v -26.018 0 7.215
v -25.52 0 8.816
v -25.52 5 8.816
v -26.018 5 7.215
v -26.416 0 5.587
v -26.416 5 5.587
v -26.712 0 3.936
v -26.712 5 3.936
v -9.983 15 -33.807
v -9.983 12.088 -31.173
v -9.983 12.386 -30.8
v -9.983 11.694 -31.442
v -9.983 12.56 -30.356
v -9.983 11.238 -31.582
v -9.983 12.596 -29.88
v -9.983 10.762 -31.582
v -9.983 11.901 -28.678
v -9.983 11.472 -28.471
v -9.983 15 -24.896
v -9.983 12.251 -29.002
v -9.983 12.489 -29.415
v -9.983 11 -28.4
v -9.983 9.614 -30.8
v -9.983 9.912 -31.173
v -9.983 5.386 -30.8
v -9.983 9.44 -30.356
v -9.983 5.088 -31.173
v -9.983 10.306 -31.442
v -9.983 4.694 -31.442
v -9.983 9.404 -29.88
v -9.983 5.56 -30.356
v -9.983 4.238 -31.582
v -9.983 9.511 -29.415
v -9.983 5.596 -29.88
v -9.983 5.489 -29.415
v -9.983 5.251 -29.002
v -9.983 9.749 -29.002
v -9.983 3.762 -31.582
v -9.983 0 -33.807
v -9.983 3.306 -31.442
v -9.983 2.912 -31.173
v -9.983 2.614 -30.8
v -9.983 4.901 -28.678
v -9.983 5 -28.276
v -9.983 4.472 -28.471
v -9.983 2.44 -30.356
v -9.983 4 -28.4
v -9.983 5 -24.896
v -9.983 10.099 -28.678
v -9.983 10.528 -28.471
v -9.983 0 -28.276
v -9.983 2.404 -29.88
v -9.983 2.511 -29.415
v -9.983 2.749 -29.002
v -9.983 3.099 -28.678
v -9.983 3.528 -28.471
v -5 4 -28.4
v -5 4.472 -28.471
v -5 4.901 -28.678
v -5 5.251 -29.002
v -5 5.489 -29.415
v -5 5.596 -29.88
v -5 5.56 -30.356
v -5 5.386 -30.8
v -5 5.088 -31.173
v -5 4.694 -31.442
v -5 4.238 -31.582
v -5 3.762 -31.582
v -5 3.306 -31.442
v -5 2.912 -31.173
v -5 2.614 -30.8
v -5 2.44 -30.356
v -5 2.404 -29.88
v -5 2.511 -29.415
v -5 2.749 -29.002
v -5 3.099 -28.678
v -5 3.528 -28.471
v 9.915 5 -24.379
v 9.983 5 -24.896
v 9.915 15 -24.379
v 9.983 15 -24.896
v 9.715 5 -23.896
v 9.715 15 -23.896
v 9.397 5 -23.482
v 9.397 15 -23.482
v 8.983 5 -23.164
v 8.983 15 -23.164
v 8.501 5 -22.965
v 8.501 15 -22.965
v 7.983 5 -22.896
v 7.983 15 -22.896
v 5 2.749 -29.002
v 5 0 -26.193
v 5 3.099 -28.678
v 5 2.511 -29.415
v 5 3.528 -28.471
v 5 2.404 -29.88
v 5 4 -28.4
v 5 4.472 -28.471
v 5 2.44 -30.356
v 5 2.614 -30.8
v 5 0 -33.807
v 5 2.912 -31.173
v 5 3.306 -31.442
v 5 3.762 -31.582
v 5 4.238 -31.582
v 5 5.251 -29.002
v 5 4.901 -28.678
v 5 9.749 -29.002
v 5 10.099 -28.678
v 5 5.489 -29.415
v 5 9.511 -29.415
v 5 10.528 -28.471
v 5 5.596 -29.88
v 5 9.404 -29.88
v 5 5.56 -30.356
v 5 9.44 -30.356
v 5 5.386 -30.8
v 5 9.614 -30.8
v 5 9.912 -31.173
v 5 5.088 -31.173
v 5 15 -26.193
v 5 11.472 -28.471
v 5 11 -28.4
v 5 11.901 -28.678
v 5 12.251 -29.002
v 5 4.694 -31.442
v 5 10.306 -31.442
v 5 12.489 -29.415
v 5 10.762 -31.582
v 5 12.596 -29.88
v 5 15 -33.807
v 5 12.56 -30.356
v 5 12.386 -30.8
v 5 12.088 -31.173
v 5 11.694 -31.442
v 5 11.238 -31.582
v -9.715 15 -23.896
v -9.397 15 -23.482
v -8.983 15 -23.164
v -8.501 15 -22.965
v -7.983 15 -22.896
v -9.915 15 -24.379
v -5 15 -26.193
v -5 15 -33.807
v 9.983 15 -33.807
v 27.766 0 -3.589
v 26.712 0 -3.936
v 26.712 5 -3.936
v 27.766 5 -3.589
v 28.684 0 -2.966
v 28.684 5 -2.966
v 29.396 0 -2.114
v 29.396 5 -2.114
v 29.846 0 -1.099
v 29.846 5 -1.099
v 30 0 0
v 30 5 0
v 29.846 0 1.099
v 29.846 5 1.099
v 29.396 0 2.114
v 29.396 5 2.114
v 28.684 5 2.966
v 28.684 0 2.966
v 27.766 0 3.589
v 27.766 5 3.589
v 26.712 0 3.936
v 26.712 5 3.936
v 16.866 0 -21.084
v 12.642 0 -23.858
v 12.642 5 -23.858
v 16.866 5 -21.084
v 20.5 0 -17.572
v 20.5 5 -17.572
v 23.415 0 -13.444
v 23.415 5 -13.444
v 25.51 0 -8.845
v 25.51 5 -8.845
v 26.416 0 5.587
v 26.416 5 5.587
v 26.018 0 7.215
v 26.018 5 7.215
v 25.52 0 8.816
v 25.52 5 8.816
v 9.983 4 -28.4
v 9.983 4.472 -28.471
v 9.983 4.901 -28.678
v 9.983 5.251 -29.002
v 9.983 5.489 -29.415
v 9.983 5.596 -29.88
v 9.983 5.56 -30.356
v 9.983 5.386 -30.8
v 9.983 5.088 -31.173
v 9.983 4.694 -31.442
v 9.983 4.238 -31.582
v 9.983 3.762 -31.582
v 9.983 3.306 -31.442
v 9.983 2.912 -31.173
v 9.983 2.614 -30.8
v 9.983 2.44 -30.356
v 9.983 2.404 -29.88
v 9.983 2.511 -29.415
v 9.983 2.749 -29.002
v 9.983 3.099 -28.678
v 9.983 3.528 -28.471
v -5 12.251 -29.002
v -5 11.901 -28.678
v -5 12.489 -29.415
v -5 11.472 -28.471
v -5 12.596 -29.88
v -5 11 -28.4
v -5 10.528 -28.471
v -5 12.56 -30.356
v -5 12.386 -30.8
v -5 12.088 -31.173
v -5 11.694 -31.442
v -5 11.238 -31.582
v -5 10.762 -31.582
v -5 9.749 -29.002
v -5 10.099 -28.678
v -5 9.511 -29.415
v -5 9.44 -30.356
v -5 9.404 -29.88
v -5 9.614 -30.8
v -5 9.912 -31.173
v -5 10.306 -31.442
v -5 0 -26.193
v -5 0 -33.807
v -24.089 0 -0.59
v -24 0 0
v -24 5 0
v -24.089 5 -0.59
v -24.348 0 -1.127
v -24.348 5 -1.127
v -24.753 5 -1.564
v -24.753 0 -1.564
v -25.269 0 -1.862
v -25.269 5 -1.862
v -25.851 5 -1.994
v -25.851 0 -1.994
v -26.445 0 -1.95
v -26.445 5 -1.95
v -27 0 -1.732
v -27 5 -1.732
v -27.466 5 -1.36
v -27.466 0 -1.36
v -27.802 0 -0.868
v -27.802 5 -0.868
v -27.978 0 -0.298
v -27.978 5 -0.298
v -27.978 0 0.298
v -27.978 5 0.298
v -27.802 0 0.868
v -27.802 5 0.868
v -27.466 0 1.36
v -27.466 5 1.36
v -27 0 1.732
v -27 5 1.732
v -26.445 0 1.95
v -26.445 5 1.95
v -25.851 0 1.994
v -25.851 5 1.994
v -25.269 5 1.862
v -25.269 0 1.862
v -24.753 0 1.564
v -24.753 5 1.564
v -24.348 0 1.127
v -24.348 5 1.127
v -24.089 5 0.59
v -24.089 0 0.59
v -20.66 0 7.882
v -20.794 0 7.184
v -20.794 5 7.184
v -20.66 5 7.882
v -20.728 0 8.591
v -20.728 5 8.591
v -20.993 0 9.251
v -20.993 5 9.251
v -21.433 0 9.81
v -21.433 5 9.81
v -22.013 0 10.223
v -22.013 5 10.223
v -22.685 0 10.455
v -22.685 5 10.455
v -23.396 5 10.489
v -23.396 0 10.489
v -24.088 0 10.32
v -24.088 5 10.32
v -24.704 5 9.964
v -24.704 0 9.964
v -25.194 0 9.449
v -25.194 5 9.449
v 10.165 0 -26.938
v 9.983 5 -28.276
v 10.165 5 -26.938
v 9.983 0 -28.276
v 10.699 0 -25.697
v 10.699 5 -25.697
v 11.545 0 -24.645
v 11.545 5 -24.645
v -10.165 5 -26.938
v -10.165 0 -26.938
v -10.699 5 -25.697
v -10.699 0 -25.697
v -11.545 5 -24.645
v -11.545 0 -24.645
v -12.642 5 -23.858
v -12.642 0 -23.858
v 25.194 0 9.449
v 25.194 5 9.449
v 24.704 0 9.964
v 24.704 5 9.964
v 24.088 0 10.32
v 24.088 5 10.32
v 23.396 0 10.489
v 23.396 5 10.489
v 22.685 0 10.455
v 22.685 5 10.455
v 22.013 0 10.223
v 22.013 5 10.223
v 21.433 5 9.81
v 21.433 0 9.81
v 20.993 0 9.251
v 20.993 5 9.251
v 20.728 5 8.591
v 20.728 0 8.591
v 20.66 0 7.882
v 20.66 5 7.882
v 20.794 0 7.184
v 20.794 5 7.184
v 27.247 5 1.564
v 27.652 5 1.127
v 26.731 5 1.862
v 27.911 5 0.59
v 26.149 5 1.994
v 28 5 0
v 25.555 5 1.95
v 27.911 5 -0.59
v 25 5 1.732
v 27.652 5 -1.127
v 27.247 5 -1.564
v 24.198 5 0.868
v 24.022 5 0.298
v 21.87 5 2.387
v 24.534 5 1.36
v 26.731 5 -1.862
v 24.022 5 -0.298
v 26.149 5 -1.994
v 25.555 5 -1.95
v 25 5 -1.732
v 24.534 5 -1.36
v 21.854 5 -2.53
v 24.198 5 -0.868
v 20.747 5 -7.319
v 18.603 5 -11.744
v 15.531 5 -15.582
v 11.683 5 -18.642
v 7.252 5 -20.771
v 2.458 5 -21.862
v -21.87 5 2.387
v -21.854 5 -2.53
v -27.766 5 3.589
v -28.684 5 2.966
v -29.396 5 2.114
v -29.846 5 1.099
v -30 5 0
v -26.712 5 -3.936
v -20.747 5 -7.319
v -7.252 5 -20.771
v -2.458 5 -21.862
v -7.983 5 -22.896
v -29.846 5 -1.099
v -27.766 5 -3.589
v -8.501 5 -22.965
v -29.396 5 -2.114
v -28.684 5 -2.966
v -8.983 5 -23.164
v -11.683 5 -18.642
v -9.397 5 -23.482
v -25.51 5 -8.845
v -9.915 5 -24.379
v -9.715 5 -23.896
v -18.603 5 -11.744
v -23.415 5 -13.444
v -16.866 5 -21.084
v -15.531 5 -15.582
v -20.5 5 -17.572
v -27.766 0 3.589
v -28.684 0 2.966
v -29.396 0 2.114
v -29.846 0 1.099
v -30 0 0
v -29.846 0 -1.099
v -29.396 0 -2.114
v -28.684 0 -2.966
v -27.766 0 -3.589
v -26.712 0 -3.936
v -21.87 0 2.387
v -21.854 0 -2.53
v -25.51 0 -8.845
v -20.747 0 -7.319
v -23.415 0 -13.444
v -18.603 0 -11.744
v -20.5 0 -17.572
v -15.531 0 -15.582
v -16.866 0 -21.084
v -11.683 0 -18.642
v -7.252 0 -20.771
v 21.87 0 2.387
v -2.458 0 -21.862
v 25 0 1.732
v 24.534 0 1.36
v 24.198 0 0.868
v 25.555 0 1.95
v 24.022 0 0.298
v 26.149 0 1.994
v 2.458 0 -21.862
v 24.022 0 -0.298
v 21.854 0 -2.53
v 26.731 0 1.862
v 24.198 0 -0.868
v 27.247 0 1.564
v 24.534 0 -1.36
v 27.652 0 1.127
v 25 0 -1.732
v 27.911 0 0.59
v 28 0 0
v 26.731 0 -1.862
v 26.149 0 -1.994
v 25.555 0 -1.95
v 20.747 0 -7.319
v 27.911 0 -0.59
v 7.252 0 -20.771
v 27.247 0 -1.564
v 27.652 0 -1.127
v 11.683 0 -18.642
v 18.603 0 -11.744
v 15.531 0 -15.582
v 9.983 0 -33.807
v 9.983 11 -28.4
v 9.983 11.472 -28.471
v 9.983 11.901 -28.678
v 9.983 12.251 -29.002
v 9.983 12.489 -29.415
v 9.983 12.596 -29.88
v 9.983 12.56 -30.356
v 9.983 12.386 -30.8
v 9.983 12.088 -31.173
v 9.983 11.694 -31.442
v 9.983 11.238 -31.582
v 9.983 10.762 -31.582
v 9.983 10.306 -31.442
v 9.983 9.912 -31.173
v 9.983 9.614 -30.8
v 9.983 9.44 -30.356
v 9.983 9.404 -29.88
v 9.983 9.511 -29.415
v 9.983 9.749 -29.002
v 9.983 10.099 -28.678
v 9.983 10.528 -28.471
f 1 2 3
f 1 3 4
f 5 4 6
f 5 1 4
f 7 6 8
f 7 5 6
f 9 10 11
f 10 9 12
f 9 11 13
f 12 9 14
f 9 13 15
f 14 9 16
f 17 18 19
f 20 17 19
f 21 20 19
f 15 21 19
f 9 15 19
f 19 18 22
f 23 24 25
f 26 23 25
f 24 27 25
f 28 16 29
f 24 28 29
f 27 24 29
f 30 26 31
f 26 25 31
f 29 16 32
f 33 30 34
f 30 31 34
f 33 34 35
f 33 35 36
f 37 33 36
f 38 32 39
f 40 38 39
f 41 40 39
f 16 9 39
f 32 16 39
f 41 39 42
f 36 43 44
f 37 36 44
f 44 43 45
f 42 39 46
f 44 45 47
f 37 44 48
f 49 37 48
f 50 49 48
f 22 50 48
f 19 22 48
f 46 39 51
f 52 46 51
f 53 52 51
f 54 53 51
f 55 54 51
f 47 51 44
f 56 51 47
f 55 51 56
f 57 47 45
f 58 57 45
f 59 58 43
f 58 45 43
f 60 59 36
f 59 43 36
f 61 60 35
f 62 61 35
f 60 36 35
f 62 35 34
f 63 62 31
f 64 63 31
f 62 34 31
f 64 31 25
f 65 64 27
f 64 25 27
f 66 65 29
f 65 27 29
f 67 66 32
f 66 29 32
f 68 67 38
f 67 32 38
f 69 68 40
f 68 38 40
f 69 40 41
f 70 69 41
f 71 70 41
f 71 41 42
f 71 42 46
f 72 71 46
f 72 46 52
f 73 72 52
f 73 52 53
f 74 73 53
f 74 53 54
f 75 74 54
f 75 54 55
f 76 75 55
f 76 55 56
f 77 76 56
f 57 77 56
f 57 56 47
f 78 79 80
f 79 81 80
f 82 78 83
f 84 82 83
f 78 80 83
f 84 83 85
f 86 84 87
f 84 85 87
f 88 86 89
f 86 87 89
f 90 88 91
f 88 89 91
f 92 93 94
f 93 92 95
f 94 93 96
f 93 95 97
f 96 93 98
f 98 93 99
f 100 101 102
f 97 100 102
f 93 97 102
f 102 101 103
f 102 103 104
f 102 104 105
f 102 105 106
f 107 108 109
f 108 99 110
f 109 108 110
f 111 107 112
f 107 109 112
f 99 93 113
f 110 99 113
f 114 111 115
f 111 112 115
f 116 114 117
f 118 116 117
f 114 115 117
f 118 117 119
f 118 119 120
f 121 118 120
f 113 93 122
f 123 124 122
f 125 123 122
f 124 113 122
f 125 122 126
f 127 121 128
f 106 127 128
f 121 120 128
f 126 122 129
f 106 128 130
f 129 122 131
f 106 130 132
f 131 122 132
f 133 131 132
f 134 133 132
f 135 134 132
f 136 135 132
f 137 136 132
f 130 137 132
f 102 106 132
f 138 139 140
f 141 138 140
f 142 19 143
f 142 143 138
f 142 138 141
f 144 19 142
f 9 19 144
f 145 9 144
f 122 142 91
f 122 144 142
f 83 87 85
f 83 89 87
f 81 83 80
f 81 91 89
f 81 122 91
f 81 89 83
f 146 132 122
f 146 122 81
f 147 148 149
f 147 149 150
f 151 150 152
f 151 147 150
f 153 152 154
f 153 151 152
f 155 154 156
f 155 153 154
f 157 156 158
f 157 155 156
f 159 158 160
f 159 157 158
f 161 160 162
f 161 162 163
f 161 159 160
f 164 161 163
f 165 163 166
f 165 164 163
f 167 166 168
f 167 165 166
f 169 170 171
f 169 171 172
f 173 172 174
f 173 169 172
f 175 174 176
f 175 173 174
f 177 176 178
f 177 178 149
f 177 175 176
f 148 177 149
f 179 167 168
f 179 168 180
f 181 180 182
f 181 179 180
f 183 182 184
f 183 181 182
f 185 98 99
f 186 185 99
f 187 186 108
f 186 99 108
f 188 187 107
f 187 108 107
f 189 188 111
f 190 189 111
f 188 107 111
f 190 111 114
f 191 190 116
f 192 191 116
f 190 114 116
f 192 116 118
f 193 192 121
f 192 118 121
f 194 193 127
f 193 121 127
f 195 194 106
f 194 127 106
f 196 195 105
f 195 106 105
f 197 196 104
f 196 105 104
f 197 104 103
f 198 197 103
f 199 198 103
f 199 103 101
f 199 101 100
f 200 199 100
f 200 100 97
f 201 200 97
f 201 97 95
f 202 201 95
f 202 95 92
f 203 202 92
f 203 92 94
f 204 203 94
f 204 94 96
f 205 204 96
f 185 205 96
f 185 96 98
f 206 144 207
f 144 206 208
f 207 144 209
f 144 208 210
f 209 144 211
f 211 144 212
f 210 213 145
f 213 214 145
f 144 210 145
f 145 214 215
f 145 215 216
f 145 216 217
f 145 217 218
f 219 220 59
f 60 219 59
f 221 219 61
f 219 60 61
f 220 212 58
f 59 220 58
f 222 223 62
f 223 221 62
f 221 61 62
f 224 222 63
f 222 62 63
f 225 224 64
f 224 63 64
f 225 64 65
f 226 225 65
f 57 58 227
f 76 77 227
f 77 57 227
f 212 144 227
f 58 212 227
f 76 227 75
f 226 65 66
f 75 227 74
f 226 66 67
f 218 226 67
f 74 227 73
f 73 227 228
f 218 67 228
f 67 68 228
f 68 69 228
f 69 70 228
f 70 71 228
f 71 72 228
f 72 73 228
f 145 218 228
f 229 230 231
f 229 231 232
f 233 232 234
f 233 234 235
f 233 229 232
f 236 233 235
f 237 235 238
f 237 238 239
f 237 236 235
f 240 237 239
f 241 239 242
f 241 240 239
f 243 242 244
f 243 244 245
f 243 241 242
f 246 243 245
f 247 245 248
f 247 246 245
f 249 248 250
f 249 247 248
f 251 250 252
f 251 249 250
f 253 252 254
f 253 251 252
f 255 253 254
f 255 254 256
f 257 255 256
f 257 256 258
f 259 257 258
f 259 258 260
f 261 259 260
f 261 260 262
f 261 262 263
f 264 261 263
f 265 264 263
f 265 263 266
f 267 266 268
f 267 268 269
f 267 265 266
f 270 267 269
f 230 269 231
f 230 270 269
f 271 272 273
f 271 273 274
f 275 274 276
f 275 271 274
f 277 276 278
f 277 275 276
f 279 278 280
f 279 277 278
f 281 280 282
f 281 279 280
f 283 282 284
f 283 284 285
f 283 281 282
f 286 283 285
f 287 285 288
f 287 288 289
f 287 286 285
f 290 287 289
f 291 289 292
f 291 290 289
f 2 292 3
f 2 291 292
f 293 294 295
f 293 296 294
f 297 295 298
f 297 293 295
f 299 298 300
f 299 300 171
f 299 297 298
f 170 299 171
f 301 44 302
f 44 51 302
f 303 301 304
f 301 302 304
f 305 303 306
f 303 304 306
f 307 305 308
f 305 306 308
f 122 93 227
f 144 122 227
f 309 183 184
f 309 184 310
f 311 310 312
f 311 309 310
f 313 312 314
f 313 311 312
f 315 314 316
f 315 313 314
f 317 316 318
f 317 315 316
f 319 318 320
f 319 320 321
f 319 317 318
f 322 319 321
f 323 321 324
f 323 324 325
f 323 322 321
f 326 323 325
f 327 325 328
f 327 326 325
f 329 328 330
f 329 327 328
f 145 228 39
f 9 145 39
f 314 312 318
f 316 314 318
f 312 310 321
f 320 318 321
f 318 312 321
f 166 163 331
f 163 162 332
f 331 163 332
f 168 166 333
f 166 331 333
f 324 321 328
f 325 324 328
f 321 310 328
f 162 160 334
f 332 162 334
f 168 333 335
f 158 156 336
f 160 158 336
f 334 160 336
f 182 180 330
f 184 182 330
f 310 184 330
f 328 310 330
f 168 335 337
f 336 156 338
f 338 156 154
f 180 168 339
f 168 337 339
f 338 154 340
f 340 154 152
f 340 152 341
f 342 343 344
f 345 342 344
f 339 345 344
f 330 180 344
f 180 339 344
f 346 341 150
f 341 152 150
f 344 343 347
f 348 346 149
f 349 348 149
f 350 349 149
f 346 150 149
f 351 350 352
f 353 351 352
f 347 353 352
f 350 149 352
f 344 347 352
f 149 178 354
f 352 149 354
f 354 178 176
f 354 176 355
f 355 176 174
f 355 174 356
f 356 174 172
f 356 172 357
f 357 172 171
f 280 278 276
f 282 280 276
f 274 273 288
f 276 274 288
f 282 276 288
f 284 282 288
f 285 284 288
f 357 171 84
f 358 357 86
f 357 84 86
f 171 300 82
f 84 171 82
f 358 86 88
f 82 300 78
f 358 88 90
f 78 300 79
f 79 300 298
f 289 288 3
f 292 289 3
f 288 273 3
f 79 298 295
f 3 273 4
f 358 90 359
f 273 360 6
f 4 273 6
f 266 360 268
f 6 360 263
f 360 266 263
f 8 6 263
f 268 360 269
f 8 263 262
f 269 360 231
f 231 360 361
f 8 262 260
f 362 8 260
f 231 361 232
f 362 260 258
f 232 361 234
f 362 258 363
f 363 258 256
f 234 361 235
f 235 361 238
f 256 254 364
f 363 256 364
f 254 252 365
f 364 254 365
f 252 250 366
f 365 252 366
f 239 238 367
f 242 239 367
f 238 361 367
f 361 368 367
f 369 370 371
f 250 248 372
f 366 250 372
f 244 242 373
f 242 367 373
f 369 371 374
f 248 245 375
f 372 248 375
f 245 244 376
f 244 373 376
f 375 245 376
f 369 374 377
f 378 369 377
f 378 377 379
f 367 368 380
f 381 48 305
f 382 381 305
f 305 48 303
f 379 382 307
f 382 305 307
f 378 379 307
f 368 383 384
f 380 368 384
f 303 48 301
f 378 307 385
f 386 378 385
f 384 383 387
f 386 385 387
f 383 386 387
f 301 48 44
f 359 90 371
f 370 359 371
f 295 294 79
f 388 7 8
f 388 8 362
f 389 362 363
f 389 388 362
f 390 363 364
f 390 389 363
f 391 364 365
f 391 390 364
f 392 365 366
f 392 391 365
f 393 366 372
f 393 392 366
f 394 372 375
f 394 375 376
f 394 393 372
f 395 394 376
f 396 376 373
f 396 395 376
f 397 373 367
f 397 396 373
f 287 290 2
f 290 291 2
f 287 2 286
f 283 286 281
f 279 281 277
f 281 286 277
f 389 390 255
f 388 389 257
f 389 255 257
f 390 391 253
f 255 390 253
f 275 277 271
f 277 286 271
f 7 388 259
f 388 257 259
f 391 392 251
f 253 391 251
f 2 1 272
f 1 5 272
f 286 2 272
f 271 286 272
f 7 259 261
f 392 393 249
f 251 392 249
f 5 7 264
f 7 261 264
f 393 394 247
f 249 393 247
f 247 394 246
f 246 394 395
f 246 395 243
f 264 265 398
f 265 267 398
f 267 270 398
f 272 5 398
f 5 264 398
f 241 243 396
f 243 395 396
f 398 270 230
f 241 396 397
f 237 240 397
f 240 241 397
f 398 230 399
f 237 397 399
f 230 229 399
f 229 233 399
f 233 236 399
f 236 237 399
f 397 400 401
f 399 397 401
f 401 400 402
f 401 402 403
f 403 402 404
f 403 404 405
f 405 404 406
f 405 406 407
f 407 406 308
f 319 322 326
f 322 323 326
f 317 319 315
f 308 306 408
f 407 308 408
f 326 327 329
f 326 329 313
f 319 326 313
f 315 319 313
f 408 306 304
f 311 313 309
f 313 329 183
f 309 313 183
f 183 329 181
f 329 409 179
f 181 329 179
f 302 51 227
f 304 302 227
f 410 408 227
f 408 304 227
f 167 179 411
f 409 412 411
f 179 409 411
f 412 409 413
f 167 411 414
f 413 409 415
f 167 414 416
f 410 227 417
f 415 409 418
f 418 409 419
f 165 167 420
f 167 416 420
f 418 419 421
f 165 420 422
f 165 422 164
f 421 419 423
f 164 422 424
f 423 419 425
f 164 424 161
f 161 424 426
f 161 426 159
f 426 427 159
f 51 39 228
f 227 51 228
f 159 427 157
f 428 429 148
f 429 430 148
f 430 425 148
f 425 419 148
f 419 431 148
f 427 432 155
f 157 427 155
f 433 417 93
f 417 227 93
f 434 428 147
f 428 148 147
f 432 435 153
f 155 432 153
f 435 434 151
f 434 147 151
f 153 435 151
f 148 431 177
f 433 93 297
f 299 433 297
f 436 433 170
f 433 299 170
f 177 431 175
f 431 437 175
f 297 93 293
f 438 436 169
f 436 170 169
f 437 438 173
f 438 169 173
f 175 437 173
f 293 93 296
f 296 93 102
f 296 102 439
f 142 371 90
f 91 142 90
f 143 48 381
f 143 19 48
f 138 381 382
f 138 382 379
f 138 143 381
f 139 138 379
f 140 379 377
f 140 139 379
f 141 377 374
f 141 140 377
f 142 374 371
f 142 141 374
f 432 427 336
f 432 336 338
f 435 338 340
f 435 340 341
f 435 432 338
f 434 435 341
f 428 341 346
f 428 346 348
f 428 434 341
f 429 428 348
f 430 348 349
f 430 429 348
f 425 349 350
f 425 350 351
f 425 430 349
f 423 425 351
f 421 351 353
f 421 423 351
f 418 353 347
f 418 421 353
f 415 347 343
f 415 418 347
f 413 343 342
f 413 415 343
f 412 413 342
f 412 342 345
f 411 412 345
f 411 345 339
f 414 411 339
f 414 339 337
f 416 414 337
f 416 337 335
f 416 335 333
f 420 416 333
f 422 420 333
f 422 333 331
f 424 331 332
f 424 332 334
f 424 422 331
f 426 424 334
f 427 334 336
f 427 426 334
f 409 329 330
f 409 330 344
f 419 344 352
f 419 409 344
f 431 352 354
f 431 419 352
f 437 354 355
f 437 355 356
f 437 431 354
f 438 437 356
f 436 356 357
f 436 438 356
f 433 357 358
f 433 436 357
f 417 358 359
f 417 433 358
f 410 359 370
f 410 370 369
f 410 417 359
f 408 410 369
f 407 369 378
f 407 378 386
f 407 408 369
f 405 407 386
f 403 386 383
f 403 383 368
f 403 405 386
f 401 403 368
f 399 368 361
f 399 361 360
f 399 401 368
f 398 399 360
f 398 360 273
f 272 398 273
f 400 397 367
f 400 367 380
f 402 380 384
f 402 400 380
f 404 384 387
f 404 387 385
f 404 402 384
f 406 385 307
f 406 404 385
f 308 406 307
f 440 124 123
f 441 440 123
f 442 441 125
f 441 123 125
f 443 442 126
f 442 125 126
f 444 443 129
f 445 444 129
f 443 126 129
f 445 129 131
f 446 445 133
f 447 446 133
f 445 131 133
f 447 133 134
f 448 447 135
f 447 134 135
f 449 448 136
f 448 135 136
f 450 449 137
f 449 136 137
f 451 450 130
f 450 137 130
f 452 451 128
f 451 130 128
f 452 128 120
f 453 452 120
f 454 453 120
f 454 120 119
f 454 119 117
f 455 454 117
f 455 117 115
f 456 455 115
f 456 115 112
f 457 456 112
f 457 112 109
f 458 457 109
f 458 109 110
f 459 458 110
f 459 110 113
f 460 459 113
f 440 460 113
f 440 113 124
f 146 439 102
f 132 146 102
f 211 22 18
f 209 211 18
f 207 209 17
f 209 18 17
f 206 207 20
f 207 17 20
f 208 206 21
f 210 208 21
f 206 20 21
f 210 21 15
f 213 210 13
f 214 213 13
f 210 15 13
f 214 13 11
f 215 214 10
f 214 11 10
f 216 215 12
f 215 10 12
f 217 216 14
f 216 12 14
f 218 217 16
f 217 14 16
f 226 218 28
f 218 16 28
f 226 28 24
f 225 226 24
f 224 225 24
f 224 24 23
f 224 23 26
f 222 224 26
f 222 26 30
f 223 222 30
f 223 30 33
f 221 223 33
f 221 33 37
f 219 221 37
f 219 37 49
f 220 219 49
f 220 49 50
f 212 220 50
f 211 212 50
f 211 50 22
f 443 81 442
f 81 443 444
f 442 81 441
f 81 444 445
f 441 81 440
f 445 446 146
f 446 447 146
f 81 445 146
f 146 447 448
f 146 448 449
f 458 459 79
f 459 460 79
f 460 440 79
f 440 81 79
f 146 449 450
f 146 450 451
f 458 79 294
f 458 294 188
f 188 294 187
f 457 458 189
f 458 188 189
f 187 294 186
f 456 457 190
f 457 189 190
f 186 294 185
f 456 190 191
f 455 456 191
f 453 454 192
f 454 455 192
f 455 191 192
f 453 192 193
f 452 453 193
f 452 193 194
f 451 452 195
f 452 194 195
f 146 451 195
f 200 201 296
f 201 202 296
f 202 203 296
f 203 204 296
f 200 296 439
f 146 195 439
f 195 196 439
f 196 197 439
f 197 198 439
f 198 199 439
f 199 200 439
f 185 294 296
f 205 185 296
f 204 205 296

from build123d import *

# Parameters (mm, degrees)
SKETCH_1_R          = 2
EXTRUDE_1_DEPTH     = 5
EXTRUDE_2_DEPTH     = 15
SKETCH_5_W          = 10
SKETCH_5_H          = 7.614001554
CUT_EXTRUDE_2_DEPTH = 6
SKETCH_4_R          = 1.6
CUT_EXTRUDE_1_DEPTH = 40.982946782
FILLET_2_R          = 5
FILLET_3_R          = 2


with BuildPart() as part:
    # 草图1 → 凸台-拉伸1 (new body)
    with BuildSketch(Plane(origin=(0, 0, 0), x_dir=(1, 0, 0), z_dir=(0, 1, 0))):
        with BuildLine():
            ThreePointArc((20.794105787, -7.183673469), (0, 22), (-20.794105787, -7.183673469))
            ThreePointArc((-20.794105787, -7.183673469), (-22.340745823, -10.362966567), (-25.520038921, -8.816326531))
            ThreePointArc((-25.520038921, -8.816326531), (-26.229531343, -6.404036657), (-26.711538462, -3.936205408))
            ThreePointArc((-26.711538462, -3.936205408), (-30, 0), (-26.711538462, 3.936205408))
            ThreePointArc((-26.711538462, 3.936205408), (0, 27), (26.711538462, 3.936205408))
            ThreePointArc((26.711538462, 3.936205408), (30, 0), (26.711538462, -3.936205408))
            ThreePointArc((26.711538462, -3.936205408), (26.229531343, -6.404036657), (25.520038921, -8.816326531))
            ThreePointArc((25.520038921, -8.816326531), (22.340745823, -10.362966567), (20.794105787, -7.183673469))
        make_face()
        with Locations((-26, 0)):
            Circle(SKETCH_1_R, mode=Mode.SUBTRACT)
        with Locations((26, 0)):
            Circle(SKETCH_1_R, mode=Mode.SUBTRACT)
    extrude(amount=EXTRUDE_1_DEPTH)

    # 草图3 → 凸台-拉伸2 (add)
    with BuildSketch(Plane(origin=(0, 0, 0), x_dir=(1, 0, 0), z_dir=(0, 1, 0))):
        Polygon((-5, 33.807000777), (-9.982946782, 33.807000777), (-9.982946782, 22.896387671), (9.982946782, 22.896387671), (9.982946782, 33.807000777), (5, 33.807000777), (5, 26.192999223), (-5, 26.192999223), align=None)
    extrude(amount=EXTRUDE_2_DEPTH)

    # 草图5 → 切除-拉伸2 (cut, through all)
    with BuildSketch(Plane(origin=(0, 5, 0), x_dir=(1, 0, 0), z_dir=(0, 1, 0))):
        with Locations((0, 30)):
            Rectangle(SKETCH_5_W, SKETCH_5_H)
    extrude(amount=-CUT_EXTRUDE_2_DEPTH, mode=Mode.SUBTRACT)

    # 草图4 → 切除-拉伸1 (cut, through all)
    with BuildSketch(Plane.ZY.offset(9.982946782)):
        with Locations((-30, 4)):
            Circle(SKETCH_4_R)
        with Locations((-30, 11)):
            Circle(SKETCH_4_R)
    extrude(amount=-CUT_EXTRUDE_1_DEPTH, mode=Mode.SUBTRACT)

    # 圆角2
    fillet_2_edges = [part.edges().sort_by_distance(p)[0] for p in [
        (9.982946782, 2.5, -25.086665254),
        (-9.982946782, 2.5, -25.086665254),
    ]]
    fillet(fillet_2_edges, radius=FILLET_2_R)

    # 圆角3
    fillet_3_edges = [part.edges().sort_by_distance(p)[0] for p in [
        (-9.982946782, 10, -22.896387671),
        (9.982946782, 10, -22.896387671),
    ]]
    fillet(fillet_3_edges, radius=FILLET_3_R)


solid = part.part
